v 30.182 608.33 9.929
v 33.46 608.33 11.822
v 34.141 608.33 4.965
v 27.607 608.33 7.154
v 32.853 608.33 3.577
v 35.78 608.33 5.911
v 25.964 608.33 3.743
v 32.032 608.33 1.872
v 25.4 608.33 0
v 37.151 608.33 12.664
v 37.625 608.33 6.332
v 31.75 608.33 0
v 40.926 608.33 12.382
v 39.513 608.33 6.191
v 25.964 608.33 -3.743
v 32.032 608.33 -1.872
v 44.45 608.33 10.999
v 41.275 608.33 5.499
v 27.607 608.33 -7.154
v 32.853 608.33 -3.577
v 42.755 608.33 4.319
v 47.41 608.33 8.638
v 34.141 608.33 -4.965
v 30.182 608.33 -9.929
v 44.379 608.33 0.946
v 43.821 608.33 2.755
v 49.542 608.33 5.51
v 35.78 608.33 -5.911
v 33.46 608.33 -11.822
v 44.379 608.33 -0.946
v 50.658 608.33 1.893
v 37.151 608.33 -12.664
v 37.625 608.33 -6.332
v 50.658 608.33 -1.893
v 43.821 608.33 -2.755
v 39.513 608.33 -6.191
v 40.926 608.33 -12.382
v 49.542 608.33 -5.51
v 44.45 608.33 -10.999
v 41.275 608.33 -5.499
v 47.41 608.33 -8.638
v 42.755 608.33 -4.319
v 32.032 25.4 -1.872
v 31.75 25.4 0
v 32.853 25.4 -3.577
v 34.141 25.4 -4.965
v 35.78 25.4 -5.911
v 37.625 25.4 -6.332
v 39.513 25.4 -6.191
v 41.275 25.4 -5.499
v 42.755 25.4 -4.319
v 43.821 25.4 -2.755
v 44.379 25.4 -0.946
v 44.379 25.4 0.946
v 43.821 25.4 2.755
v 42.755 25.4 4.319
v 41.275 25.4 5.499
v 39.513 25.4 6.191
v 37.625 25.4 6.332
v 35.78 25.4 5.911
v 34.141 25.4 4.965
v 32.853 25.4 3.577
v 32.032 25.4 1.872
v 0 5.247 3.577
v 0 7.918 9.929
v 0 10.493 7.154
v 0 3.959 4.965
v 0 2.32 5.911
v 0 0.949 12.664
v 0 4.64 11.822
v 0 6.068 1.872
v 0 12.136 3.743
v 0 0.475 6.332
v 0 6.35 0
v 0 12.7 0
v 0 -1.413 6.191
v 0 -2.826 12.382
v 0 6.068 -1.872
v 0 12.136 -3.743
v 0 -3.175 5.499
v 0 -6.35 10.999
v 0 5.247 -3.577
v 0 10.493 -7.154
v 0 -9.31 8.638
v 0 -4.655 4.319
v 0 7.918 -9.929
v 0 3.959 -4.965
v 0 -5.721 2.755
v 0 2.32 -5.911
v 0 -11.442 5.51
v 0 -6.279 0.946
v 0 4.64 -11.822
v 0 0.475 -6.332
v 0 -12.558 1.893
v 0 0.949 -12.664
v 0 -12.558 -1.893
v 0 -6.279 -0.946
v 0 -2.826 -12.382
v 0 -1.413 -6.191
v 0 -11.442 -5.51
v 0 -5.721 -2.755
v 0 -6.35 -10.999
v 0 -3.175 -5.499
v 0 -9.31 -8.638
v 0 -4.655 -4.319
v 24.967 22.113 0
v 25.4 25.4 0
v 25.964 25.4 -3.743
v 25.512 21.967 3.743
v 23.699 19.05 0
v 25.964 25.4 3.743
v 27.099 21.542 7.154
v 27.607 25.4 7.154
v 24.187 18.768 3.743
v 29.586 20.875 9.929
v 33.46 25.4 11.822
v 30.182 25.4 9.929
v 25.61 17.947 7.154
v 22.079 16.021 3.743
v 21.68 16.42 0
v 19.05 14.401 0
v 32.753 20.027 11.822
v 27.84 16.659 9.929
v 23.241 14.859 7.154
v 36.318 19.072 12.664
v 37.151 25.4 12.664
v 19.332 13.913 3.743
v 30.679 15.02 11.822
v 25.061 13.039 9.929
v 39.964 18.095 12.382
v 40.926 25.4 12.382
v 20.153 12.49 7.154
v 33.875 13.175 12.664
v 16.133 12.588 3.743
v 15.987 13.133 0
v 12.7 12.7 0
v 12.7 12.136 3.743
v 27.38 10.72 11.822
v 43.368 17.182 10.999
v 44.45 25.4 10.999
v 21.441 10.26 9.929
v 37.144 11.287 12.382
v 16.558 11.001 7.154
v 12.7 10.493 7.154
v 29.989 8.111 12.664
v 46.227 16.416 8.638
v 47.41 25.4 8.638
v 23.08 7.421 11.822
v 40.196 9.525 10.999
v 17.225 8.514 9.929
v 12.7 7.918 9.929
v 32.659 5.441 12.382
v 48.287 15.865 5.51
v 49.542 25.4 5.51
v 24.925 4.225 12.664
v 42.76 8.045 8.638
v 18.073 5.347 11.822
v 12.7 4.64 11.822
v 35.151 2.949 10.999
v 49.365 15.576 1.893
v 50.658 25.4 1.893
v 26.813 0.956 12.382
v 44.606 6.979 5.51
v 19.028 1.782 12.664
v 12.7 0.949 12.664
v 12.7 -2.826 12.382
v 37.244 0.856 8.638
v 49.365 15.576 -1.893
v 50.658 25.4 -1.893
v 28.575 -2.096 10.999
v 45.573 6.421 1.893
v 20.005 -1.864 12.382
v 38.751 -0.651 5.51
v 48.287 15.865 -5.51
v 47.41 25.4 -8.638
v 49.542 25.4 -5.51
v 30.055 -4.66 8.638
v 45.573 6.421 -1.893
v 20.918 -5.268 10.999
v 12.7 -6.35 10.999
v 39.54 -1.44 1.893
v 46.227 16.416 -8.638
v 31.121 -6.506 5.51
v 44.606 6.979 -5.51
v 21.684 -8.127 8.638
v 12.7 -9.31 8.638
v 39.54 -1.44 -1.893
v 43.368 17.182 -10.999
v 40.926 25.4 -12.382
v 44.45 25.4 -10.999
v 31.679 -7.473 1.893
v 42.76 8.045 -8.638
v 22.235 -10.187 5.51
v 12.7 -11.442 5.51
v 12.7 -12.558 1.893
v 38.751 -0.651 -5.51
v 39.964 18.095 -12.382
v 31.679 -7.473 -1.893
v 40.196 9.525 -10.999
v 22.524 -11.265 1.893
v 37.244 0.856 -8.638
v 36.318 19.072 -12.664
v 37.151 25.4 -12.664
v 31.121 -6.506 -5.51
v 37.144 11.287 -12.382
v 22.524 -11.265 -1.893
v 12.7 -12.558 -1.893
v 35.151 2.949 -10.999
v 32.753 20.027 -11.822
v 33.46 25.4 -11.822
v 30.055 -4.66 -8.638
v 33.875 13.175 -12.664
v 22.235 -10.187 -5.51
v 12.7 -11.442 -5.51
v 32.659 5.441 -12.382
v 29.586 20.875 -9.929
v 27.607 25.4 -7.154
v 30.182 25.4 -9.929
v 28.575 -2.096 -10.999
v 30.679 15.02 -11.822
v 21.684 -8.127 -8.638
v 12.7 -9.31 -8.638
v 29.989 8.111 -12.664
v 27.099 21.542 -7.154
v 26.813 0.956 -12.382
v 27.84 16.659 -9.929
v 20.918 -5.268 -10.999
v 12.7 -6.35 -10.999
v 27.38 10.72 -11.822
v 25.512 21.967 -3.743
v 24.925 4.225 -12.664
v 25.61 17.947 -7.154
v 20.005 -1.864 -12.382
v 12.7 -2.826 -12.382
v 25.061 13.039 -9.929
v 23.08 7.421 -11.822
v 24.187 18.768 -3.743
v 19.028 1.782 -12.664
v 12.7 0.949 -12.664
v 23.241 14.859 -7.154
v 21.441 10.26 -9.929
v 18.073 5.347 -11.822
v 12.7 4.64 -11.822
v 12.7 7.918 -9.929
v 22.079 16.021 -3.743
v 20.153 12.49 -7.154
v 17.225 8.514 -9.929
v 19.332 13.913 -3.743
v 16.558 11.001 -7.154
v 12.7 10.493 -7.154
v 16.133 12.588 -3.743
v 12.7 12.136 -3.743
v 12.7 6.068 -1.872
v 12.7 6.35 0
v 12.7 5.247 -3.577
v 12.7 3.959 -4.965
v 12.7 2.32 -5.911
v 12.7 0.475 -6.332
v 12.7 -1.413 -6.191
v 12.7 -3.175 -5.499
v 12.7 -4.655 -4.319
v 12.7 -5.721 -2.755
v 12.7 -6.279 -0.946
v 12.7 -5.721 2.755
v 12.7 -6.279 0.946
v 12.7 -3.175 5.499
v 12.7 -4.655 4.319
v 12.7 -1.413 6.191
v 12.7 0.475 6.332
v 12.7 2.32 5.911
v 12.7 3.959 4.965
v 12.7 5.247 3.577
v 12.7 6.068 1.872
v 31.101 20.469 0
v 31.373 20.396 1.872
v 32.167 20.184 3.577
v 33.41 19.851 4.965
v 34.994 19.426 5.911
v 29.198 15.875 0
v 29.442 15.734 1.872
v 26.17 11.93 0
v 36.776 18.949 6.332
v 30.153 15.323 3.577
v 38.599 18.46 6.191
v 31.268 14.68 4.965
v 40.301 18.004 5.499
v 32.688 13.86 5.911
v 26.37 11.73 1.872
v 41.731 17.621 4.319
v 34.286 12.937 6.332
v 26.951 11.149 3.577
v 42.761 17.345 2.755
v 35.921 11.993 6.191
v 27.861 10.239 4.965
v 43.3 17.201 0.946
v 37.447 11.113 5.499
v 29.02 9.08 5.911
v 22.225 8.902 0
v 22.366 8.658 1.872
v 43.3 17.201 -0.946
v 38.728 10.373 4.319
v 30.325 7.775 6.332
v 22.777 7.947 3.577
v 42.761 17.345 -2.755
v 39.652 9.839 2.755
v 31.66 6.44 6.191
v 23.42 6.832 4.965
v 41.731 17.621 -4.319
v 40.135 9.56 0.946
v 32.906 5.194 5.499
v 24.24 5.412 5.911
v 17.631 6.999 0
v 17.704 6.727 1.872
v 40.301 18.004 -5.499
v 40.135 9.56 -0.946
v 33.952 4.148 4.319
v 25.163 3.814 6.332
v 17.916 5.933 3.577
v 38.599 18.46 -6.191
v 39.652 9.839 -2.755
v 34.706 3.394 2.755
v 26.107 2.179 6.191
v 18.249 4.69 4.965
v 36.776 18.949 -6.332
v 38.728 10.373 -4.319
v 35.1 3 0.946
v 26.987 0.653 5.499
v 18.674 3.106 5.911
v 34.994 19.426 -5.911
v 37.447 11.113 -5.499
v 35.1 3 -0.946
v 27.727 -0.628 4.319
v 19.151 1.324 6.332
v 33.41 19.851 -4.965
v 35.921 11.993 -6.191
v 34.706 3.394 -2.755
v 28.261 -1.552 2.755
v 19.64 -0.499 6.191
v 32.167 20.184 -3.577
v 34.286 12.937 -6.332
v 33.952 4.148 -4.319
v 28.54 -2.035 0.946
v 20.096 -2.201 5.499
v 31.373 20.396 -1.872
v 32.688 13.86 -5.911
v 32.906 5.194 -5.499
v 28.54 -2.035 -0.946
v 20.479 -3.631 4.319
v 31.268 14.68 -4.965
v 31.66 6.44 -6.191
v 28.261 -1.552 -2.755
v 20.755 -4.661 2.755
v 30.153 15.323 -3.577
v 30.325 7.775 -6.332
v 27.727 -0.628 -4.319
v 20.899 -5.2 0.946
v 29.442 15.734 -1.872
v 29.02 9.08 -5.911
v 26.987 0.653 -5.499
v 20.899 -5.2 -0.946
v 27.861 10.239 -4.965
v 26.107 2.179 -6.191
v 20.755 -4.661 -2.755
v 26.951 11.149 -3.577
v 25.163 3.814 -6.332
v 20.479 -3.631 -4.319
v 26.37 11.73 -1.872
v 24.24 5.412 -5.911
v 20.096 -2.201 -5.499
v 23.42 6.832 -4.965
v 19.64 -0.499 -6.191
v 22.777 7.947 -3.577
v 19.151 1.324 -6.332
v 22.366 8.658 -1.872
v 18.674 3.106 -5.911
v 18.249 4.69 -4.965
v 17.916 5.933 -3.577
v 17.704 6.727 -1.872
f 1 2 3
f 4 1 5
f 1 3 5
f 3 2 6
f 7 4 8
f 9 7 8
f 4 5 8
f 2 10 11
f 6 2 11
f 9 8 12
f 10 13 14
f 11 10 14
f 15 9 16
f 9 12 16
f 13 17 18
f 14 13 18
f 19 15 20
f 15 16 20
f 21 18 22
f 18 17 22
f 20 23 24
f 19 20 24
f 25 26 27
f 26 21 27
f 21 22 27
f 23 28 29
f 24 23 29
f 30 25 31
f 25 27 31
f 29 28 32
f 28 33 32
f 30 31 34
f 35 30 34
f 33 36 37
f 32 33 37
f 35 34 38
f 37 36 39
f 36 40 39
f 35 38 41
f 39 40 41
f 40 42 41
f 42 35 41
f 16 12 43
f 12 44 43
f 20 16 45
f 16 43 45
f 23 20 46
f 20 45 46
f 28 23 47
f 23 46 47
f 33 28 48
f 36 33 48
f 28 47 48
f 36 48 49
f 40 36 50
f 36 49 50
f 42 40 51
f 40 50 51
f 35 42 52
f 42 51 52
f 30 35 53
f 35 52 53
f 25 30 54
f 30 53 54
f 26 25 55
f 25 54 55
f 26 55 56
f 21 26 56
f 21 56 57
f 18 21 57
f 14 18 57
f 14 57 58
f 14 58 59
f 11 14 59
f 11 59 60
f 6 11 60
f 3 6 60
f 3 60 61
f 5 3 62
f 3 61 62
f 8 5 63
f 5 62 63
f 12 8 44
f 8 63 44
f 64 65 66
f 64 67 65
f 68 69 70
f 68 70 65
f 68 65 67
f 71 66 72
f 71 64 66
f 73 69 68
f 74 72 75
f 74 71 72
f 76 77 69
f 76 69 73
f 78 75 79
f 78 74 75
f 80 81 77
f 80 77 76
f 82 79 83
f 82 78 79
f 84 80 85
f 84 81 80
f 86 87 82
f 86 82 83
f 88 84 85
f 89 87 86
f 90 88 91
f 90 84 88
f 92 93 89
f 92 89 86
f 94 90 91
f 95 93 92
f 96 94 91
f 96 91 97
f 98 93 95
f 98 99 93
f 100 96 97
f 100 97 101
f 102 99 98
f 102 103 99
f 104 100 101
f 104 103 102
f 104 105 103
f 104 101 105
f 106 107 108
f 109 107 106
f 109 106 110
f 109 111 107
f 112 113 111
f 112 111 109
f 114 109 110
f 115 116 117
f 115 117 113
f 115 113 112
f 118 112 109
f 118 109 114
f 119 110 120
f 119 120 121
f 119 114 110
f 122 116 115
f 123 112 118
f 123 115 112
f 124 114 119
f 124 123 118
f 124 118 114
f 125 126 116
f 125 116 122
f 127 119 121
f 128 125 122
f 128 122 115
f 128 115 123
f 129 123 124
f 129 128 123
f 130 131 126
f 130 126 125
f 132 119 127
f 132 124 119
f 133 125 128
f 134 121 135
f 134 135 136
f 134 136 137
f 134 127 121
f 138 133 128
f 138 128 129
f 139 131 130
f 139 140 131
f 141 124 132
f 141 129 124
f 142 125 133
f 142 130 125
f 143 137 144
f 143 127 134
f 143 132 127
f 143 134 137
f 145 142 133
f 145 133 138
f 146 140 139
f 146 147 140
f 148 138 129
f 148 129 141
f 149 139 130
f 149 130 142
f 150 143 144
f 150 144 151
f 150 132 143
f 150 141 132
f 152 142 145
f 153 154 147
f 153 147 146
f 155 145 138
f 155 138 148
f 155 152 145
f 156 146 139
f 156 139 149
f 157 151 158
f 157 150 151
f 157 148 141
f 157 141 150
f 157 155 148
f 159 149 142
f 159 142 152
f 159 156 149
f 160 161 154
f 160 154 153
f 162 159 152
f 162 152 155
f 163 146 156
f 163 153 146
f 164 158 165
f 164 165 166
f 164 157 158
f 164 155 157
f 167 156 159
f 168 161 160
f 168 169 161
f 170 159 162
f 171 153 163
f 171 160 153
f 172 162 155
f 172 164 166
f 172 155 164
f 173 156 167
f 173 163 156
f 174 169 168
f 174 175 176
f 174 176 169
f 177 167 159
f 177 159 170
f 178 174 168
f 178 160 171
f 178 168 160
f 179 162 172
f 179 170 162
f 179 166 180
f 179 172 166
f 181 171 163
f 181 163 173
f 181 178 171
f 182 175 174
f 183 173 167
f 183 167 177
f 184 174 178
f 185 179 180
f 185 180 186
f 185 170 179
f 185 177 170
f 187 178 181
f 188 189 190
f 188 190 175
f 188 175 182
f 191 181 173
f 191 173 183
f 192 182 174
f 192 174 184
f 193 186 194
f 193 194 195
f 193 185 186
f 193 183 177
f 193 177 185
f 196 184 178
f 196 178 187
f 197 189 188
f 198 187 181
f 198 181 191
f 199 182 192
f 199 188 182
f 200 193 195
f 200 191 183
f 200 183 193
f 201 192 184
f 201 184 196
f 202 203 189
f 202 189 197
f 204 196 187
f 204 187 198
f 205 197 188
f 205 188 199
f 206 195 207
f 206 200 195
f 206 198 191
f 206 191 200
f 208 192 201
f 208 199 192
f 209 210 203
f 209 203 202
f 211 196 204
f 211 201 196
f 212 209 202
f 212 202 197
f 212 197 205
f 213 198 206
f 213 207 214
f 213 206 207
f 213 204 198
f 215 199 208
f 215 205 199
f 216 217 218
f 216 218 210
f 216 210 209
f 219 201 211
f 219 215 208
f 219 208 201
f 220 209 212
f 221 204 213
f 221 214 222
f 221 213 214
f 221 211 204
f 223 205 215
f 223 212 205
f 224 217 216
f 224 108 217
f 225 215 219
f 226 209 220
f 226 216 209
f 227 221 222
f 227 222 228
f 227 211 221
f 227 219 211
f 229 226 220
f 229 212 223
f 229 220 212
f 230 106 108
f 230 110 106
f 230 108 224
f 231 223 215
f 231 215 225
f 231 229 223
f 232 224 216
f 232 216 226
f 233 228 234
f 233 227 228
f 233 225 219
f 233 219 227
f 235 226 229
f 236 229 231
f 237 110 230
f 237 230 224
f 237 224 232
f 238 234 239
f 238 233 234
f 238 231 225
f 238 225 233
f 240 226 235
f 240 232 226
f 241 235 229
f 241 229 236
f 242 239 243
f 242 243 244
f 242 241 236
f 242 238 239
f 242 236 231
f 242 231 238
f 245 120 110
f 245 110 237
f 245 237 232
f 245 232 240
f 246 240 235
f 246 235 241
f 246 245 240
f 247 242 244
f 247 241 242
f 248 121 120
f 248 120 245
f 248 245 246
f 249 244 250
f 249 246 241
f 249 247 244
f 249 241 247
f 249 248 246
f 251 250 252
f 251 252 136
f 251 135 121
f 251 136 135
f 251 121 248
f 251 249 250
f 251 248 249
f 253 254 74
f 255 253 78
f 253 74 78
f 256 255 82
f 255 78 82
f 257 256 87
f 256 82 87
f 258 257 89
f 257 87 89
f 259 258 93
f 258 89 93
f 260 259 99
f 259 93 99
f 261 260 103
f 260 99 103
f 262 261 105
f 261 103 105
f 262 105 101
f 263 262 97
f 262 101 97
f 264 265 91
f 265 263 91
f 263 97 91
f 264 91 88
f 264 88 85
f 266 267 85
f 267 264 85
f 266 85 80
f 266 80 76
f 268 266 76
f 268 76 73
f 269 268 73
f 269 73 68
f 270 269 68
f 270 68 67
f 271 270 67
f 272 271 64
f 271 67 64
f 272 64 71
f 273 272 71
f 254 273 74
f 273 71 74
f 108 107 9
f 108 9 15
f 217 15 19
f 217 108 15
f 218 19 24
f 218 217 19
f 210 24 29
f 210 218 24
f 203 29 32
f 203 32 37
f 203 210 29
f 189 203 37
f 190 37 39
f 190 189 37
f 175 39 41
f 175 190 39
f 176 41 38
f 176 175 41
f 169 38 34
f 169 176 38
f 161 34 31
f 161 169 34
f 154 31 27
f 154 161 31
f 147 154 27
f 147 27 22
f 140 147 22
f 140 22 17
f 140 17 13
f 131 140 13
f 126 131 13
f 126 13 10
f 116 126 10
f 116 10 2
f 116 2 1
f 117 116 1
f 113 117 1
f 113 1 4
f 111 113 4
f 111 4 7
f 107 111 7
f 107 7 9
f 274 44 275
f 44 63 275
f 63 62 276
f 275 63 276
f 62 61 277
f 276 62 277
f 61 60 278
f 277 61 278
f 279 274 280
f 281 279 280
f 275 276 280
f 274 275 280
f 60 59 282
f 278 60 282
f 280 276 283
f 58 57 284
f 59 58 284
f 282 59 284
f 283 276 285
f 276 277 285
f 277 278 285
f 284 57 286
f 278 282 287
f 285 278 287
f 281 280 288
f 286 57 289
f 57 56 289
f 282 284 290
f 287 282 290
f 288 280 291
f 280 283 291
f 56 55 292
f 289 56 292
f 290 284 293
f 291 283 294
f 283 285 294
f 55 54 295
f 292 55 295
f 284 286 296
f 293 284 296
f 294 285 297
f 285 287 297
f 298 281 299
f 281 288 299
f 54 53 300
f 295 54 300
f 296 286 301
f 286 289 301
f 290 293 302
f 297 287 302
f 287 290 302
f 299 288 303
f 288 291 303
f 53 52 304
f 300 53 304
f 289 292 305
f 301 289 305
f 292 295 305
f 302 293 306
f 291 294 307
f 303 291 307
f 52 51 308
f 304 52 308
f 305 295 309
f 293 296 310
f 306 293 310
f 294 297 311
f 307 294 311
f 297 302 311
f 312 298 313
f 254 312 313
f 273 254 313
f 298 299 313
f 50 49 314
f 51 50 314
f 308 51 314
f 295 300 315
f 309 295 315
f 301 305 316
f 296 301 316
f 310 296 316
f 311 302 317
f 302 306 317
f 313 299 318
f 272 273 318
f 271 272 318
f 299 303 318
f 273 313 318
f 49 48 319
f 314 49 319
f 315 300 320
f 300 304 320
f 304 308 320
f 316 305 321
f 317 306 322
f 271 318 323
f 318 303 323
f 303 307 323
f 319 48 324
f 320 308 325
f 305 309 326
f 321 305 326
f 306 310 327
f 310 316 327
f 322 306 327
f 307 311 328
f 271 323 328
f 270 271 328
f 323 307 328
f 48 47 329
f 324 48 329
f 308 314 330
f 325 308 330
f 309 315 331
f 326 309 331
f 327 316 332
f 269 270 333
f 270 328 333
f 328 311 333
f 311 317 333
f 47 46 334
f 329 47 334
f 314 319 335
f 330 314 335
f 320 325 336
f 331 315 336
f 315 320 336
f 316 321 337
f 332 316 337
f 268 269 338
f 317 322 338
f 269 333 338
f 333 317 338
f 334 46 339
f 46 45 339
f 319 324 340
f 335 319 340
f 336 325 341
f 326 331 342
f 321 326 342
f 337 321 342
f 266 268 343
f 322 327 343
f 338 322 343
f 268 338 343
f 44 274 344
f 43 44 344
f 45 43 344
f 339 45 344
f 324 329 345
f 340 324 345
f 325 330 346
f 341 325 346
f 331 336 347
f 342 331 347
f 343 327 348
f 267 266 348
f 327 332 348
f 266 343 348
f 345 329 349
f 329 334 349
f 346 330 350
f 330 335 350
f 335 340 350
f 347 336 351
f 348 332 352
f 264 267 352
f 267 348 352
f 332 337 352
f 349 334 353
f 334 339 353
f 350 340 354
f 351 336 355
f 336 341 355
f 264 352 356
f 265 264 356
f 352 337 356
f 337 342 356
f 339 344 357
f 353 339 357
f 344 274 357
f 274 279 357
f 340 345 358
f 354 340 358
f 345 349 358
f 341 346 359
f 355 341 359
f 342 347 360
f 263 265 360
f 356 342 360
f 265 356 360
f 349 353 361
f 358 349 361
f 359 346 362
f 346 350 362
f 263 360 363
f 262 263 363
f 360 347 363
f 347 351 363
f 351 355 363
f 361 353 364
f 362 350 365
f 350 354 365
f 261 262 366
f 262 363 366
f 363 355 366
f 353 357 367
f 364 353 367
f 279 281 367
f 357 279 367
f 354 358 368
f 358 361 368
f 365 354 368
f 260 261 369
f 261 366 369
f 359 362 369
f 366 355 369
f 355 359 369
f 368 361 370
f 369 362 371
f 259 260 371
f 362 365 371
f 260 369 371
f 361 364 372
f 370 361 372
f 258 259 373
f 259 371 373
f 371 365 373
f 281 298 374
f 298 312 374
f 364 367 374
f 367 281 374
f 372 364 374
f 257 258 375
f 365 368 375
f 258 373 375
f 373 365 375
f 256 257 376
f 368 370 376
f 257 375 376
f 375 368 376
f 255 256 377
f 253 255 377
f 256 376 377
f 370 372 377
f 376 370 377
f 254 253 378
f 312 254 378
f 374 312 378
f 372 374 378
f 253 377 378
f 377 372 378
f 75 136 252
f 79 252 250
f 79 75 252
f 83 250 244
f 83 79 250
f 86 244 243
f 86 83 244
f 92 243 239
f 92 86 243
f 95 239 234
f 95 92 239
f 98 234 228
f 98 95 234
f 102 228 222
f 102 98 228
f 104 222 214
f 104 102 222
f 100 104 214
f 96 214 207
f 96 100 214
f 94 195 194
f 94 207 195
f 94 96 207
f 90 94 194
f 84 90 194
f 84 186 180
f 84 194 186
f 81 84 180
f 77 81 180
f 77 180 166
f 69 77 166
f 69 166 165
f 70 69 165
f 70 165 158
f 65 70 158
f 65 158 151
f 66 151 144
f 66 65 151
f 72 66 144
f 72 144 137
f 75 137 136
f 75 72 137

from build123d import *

# Parameters (mm, degrees)
SWEEP1_PROFILE_R = 12.7
SHELL2_T         = -6.35


with BuildPart() as part:
    # Sweep1: sweep along a path in Sketch1
    with BuildLine(Plane.XY) as sweep1_path:
        Line((38.1, 608.33), (38.1, 25.4))
        ThreePointArc((38.1, 25.4), (30.660512242, 7.439487758), (12.7, 0))
        Line((12.7, 0), (0, 0))
    # Sweep1 profile (on start of the path) → Sweep1 (sweep)
    with BuildSketch(Plane(origin=(38.1, 608.33, 0), x_dir=(-1, 0, 0), z_dir=(0, -1, 0))):
        Circle(SWEEP1_PROFILE_R)
    sweep(path=sweep1_path.line)

    # Shell2
    shell2_openings = [part.faces().sort_by_distance(p)[0] for p in [
        (0, 12.7, 0),
        (25.4, 608.33, 0),
    ]]
    offset(amount=SHELL2_T, openings=shell2_openings, kind=Kind.INTERSECTION)


solid = part.part
